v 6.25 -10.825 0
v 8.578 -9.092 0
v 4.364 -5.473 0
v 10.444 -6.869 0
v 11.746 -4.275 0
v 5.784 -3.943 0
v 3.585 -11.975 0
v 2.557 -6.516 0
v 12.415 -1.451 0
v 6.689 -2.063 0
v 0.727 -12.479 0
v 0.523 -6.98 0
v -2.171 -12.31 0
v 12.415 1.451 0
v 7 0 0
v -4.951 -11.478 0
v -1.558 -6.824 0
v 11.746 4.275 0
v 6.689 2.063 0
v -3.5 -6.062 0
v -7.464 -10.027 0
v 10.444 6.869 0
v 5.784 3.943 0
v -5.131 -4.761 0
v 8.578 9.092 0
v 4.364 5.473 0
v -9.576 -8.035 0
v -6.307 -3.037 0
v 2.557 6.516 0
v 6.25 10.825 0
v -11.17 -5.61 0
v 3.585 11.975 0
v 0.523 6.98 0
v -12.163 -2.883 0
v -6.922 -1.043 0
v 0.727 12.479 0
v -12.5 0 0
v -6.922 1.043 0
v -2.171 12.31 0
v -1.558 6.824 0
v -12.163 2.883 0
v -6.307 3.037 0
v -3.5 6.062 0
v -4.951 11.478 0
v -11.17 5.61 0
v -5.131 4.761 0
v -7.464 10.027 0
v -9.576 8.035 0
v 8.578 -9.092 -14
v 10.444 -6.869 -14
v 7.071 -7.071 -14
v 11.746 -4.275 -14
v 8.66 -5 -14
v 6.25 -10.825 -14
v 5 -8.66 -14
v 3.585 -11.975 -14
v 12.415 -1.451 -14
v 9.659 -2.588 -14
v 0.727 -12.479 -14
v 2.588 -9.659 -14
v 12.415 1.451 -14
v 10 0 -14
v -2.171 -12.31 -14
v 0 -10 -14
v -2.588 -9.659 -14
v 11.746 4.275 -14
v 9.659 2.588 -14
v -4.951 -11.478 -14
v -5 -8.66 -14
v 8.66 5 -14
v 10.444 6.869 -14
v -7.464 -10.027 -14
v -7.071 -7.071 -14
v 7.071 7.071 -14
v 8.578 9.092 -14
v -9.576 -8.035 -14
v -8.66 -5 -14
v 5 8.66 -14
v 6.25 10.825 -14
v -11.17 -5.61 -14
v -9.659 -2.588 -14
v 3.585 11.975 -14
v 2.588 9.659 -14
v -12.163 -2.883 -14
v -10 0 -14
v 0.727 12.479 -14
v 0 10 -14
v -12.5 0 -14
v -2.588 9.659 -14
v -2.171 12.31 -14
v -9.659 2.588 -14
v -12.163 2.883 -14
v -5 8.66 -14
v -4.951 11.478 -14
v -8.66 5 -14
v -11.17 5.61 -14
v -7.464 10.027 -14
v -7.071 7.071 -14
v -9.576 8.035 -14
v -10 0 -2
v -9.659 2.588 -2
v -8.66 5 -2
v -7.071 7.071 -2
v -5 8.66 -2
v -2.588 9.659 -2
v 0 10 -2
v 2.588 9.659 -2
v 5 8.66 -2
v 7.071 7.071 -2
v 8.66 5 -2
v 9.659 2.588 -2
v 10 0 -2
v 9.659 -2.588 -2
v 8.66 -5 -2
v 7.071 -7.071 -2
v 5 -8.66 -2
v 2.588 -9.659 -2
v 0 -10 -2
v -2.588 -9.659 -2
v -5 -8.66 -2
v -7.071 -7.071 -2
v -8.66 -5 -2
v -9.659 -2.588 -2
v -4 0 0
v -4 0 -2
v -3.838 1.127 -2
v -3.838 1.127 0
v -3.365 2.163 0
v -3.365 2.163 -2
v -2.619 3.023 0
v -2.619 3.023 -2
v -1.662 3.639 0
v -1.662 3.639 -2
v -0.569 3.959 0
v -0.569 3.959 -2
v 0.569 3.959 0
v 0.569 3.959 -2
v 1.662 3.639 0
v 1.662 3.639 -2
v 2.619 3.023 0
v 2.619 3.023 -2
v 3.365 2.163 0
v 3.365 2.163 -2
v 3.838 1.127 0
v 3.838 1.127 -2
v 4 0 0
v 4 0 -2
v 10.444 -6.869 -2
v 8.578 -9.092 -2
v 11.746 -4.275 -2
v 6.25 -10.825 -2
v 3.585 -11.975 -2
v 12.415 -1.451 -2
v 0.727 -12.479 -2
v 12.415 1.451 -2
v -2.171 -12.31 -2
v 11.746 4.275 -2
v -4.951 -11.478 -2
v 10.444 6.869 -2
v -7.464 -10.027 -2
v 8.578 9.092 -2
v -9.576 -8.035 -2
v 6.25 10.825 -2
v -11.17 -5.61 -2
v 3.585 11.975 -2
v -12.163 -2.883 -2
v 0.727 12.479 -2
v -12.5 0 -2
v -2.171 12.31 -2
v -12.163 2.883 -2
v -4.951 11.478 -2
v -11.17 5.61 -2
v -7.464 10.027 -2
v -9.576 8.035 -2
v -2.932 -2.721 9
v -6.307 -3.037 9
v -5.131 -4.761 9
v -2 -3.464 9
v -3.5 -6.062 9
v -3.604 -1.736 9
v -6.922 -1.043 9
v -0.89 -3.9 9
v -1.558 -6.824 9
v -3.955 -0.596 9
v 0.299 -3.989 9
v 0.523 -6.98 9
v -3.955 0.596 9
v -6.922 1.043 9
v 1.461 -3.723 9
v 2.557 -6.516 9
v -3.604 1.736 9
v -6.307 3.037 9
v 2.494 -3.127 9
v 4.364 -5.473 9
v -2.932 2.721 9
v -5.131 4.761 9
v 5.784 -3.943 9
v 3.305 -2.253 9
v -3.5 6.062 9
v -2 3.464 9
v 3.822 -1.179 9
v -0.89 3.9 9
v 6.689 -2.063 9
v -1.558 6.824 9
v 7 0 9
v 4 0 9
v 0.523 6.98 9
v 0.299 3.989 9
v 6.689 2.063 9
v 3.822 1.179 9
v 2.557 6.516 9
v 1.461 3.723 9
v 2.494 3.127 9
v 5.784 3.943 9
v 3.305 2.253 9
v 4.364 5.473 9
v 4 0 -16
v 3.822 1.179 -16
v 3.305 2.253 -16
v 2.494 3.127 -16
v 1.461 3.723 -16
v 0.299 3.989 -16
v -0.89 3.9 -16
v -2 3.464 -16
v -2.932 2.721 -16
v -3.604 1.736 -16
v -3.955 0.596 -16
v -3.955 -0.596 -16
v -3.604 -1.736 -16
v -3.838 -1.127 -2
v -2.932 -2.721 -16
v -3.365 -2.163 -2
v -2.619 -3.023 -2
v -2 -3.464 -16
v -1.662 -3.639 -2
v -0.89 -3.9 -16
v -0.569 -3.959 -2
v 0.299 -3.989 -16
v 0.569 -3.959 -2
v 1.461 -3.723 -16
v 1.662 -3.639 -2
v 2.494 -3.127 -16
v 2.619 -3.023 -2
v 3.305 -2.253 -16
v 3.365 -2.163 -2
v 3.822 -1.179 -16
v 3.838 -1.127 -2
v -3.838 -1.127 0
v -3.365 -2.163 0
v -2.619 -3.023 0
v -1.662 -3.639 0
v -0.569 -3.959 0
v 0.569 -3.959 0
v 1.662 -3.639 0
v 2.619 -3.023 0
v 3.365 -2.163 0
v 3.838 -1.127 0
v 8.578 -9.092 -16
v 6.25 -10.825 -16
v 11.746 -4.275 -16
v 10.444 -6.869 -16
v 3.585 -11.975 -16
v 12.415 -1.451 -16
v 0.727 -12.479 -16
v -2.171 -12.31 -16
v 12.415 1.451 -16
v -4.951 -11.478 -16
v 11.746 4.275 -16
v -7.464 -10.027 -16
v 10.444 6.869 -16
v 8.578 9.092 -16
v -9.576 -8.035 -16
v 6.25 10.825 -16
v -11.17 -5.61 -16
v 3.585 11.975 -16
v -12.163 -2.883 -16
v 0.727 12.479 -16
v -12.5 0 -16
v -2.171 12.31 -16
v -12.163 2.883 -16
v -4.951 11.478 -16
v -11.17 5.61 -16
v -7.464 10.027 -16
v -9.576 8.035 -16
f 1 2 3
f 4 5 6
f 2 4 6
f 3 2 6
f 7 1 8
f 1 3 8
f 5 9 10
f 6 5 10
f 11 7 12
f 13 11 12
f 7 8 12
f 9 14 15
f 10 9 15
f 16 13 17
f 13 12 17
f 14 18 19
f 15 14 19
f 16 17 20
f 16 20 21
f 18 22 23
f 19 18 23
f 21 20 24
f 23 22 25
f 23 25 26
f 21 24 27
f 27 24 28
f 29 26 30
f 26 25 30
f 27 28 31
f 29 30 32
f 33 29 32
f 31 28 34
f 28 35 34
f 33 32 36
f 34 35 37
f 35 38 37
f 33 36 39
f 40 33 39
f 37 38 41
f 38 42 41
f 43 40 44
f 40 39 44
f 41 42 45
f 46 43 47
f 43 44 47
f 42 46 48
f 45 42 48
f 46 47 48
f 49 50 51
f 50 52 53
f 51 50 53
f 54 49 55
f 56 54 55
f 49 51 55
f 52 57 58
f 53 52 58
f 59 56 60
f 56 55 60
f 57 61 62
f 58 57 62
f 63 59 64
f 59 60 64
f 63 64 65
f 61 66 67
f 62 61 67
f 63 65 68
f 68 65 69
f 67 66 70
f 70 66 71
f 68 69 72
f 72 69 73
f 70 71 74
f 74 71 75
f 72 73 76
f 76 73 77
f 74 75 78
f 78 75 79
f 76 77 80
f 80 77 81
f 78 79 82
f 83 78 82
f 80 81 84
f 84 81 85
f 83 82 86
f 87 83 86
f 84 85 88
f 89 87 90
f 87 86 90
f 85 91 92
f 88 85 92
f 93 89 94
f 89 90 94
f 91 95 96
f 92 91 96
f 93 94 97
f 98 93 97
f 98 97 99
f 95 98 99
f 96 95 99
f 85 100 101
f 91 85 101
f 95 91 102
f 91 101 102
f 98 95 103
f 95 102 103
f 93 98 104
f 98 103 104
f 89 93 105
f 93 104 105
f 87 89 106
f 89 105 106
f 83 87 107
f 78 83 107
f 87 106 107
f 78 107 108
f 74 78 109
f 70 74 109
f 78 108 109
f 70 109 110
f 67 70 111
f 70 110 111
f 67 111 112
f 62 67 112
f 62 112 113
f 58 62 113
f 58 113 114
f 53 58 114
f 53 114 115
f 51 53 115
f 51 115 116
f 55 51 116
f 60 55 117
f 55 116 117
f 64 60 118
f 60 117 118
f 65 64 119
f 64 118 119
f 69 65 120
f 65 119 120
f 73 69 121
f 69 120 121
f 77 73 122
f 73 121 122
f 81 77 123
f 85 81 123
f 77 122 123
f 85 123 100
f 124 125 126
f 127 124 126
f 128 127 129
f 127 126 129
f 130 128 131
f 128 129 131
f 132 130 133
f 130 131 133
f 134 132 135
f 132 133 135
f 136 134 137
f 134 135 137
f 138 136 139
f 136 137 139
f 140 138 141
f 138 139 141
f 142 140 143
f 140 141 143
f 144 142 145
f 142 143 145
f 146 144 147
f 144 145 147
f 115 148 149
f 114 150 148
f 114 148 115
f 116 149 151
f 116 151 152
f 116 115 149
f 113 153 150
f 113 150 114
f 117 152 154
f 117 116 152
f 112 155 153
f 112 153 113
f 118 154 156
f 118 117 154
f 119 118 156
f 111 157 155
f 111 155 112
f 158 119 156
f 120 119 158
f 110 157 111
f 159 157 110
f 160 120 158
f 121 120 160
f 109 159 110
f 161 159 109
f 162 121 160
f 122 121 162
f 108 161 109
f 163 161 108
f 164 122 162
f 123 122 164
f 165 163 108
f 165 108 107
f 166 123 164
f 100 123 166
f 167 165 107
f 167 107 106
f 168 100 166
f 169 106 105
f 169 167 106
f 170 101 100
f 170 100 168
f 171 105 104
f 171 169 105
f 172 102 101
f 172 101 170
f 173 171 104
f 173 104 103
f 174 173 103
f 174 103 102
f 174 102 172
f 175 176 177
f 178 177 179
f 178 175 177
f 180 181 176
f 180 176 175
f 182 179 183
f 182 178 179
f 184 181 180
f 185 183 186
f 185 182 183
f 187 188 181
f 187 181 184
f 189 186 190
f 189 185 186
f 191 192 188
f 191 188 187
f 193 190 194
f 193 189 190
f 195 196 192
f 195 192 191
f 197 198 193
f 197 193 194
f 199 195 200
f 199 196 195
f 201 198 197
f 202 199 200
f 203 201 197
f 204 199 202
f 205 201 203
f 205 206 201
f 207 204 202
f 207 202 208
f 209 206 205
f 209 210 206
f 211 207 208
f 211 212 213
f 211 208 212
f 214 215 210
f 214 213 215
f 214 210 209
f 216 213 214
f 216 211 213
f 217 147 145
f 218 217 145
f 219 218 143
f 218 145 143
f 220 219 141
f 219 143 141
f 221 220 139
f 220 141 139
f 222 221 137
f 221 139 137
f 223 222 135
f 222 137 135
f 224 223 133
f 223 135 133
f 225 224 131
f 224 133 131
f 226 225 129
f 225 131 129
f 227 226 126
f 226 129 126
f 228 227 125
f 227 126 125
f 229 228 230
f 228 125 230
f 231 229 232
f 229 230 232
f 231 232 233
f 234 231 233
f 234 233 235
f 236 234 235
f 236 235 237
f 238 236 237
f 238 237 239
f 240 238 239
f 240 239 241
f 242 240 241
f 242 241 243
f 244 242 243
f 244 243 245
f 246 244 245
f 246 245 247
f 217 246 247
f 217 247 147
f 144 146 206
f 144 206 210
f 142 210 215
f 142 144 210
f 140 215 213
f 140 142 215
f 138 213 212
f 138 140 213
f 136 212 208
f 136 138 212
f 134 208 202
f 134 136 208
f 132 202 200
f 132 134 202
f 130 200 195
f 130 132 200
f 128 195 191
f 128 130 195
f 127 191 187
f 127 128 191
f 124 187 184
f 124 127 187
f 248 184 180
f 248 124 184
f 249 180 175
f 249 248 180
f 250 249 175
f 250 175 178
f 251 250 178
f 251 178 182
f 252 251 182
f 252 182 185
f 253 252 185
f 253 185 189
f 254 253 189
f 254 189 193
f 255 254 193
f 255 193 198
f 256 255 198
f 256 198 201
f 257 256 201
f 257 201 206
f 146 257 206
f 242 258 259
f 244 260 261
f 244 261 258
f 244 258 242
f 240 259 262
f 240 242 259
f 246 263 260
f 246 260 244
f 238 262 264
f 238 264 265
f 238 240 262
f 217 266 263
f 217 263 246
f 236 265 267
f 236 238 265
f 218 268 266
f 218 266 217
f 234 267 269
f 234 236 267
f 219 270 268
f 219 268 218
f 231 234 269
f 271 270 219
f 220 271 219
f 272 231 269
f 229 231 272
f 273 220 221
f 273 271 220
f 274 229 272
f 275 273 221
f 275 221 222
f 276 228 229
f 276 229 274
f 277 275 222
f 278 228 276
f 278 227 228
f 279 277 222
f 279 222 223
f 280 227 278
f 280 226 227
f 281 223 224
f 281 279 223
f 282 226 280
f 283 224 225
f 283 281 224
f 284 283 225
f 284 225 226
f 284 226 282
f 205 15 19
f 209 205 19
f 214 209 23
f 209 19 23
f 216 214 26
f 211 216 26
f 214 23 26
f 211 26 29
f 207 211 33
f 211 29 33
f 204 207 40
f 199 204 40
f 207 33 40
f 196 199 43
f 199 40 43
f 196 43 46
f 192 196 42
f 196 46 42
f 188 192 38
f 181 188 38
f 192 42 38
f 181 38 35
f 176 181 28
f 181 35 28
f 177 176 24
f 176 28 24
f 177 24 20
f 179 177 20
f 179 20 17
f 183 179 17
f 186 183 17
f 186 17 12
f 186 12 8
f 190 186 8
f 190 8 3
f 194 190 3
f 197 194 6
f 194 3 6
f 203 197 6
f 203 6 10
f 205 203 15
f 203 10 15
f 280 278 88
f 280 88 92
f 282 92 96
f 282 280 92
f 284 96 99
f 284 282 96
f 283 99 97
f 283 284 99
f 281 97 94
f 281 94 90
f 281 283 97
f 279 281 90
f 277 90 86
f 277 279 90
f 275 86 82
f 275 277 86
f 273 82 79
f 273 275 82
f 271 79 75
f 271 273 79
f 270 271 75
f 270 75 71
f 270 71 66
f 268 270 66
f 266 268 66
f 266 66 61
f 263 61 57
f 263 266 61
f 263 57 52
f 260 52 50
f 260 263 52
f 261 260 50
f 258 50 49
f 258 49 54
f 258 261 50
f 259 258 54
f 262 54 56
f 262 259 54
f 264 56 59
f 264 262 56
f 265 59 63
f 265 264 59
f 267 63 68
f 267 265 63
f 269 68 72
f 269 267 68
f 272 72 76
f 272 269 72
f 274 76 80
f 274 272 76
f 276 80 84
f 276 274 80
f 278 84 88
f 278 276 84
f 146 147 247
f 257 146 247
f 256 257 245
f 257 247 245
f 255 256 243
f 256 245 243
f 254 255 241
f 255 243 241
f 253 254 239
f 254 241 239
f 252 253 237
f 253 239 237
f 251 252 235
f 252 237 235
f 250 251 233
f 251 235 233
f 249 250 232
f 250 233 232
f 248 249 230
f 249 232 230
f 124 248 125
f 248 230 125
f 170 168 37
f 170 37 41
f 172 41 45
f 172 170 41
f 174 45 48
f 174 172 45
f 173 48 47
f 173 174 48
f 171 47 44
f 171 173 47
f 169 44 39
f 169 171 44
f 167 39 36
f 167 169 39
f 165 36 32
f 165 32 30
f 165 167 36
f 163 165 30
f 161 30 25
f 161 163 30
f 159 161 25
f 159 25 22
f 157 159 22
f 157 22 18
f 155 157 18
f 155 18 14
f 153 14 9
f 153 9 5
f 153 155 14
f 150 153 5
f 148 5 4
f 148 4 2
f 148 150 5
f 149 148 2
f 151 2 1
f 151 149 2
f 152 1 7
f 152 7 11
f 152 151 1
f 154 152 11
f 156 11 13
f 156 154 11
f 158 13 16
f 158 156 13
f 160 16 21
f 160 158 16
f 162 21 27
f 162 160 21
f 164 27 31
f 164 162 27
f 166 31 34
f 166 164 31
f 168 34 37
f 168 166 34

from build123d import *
from build123d.topology import SkipClean

# Parameters (mm, degrees)
SKETCH_1_R          = 7
SKETCH_1_R_2        = 4
EXTRUDE_1_DEPTH     = 9
EXTRUDE_START       = 2
SKETCH_2_R          = 12.5
SKETCH_2_R_2        = 4
EXTRUDE_2_DEPTH     = 2
SKETCH_3_R          = 10
EXTRUDE_3_DEPTH     = 12
SKETCH_4_R          = 12.5
EXTRUDE_4_DEPTH     = 2
SKETCH_5_R          = 4
CUT_EXTRUDE_1_DEPTH = 31.618621785


with BuildPart() as part:
    # 草图1 → 拉伸1 (new body)
    with BuildSketch(Plane.XY):
        Circle(SKETCH_1_R)
        Circle(SKETCH_1_R_2, mode=Mode.SUBTRACT)
    extrude(amount=EXTRUDE_1_DEPTH)

    # 草图2 → 拉伸2 (add)
    with SkipClean():  # the faces are left unmerged after this step: merging them gives an invalid solid
        with BuildSketch(Plane(origin=(0, 0, 0), x_dir=(-1, 0, 0), z_dir=(0, 0, -1)).offset(EXTRUDE_START)):
            Circle(SKETCH_2_R)
            Circle(SKETCH_2_R_2, mode=Mode.SUBTRACT)
        extrude(amount=-EXTRUDE_2_DEPTH)

    # 草图3 → 拉伸3 (add)
    with SkipClean():  # the faces are left unmerged after this step: merging them gives an invalid solid
        with BuildSketch(Plane(origin=(0, 0, -2), x_dir=(-1, 0, 0), z_dir=(0, 0, -1))):
            Circle(SKETCH_3_R)
        extrude(amount=EXTRUDE_3_DEPTH)

    # 草图4 → 拉伸4 (add)
    with SkipClean():  # the faces are left unmerged after this step: merging them gives an invalid solid
        with BuildSketch(Plane(origin=(0, 0, -14), x_dir=(-1, 0, 0), z_dir=(0, 0, -1)).offset(EXTRUDE_START)):
            Circle(SKETCH_4_R)
        extrude(amount=-EXTRUDE_4_DEPTH)

    # 草图5 → 切除-拉伸1 (cut, through all)
    with SkipClean():  # the faces are left unmerged after this step: merging them gives an invalid solid
        with BuildSketch(Plane.XY.offset(9)):
            Circle(SKETCH_5_R)
        extrude(amount=-CUT_EXTRUDE_1_DEPTH, mode=Mode.SUBTRACT)


solid = part.part
